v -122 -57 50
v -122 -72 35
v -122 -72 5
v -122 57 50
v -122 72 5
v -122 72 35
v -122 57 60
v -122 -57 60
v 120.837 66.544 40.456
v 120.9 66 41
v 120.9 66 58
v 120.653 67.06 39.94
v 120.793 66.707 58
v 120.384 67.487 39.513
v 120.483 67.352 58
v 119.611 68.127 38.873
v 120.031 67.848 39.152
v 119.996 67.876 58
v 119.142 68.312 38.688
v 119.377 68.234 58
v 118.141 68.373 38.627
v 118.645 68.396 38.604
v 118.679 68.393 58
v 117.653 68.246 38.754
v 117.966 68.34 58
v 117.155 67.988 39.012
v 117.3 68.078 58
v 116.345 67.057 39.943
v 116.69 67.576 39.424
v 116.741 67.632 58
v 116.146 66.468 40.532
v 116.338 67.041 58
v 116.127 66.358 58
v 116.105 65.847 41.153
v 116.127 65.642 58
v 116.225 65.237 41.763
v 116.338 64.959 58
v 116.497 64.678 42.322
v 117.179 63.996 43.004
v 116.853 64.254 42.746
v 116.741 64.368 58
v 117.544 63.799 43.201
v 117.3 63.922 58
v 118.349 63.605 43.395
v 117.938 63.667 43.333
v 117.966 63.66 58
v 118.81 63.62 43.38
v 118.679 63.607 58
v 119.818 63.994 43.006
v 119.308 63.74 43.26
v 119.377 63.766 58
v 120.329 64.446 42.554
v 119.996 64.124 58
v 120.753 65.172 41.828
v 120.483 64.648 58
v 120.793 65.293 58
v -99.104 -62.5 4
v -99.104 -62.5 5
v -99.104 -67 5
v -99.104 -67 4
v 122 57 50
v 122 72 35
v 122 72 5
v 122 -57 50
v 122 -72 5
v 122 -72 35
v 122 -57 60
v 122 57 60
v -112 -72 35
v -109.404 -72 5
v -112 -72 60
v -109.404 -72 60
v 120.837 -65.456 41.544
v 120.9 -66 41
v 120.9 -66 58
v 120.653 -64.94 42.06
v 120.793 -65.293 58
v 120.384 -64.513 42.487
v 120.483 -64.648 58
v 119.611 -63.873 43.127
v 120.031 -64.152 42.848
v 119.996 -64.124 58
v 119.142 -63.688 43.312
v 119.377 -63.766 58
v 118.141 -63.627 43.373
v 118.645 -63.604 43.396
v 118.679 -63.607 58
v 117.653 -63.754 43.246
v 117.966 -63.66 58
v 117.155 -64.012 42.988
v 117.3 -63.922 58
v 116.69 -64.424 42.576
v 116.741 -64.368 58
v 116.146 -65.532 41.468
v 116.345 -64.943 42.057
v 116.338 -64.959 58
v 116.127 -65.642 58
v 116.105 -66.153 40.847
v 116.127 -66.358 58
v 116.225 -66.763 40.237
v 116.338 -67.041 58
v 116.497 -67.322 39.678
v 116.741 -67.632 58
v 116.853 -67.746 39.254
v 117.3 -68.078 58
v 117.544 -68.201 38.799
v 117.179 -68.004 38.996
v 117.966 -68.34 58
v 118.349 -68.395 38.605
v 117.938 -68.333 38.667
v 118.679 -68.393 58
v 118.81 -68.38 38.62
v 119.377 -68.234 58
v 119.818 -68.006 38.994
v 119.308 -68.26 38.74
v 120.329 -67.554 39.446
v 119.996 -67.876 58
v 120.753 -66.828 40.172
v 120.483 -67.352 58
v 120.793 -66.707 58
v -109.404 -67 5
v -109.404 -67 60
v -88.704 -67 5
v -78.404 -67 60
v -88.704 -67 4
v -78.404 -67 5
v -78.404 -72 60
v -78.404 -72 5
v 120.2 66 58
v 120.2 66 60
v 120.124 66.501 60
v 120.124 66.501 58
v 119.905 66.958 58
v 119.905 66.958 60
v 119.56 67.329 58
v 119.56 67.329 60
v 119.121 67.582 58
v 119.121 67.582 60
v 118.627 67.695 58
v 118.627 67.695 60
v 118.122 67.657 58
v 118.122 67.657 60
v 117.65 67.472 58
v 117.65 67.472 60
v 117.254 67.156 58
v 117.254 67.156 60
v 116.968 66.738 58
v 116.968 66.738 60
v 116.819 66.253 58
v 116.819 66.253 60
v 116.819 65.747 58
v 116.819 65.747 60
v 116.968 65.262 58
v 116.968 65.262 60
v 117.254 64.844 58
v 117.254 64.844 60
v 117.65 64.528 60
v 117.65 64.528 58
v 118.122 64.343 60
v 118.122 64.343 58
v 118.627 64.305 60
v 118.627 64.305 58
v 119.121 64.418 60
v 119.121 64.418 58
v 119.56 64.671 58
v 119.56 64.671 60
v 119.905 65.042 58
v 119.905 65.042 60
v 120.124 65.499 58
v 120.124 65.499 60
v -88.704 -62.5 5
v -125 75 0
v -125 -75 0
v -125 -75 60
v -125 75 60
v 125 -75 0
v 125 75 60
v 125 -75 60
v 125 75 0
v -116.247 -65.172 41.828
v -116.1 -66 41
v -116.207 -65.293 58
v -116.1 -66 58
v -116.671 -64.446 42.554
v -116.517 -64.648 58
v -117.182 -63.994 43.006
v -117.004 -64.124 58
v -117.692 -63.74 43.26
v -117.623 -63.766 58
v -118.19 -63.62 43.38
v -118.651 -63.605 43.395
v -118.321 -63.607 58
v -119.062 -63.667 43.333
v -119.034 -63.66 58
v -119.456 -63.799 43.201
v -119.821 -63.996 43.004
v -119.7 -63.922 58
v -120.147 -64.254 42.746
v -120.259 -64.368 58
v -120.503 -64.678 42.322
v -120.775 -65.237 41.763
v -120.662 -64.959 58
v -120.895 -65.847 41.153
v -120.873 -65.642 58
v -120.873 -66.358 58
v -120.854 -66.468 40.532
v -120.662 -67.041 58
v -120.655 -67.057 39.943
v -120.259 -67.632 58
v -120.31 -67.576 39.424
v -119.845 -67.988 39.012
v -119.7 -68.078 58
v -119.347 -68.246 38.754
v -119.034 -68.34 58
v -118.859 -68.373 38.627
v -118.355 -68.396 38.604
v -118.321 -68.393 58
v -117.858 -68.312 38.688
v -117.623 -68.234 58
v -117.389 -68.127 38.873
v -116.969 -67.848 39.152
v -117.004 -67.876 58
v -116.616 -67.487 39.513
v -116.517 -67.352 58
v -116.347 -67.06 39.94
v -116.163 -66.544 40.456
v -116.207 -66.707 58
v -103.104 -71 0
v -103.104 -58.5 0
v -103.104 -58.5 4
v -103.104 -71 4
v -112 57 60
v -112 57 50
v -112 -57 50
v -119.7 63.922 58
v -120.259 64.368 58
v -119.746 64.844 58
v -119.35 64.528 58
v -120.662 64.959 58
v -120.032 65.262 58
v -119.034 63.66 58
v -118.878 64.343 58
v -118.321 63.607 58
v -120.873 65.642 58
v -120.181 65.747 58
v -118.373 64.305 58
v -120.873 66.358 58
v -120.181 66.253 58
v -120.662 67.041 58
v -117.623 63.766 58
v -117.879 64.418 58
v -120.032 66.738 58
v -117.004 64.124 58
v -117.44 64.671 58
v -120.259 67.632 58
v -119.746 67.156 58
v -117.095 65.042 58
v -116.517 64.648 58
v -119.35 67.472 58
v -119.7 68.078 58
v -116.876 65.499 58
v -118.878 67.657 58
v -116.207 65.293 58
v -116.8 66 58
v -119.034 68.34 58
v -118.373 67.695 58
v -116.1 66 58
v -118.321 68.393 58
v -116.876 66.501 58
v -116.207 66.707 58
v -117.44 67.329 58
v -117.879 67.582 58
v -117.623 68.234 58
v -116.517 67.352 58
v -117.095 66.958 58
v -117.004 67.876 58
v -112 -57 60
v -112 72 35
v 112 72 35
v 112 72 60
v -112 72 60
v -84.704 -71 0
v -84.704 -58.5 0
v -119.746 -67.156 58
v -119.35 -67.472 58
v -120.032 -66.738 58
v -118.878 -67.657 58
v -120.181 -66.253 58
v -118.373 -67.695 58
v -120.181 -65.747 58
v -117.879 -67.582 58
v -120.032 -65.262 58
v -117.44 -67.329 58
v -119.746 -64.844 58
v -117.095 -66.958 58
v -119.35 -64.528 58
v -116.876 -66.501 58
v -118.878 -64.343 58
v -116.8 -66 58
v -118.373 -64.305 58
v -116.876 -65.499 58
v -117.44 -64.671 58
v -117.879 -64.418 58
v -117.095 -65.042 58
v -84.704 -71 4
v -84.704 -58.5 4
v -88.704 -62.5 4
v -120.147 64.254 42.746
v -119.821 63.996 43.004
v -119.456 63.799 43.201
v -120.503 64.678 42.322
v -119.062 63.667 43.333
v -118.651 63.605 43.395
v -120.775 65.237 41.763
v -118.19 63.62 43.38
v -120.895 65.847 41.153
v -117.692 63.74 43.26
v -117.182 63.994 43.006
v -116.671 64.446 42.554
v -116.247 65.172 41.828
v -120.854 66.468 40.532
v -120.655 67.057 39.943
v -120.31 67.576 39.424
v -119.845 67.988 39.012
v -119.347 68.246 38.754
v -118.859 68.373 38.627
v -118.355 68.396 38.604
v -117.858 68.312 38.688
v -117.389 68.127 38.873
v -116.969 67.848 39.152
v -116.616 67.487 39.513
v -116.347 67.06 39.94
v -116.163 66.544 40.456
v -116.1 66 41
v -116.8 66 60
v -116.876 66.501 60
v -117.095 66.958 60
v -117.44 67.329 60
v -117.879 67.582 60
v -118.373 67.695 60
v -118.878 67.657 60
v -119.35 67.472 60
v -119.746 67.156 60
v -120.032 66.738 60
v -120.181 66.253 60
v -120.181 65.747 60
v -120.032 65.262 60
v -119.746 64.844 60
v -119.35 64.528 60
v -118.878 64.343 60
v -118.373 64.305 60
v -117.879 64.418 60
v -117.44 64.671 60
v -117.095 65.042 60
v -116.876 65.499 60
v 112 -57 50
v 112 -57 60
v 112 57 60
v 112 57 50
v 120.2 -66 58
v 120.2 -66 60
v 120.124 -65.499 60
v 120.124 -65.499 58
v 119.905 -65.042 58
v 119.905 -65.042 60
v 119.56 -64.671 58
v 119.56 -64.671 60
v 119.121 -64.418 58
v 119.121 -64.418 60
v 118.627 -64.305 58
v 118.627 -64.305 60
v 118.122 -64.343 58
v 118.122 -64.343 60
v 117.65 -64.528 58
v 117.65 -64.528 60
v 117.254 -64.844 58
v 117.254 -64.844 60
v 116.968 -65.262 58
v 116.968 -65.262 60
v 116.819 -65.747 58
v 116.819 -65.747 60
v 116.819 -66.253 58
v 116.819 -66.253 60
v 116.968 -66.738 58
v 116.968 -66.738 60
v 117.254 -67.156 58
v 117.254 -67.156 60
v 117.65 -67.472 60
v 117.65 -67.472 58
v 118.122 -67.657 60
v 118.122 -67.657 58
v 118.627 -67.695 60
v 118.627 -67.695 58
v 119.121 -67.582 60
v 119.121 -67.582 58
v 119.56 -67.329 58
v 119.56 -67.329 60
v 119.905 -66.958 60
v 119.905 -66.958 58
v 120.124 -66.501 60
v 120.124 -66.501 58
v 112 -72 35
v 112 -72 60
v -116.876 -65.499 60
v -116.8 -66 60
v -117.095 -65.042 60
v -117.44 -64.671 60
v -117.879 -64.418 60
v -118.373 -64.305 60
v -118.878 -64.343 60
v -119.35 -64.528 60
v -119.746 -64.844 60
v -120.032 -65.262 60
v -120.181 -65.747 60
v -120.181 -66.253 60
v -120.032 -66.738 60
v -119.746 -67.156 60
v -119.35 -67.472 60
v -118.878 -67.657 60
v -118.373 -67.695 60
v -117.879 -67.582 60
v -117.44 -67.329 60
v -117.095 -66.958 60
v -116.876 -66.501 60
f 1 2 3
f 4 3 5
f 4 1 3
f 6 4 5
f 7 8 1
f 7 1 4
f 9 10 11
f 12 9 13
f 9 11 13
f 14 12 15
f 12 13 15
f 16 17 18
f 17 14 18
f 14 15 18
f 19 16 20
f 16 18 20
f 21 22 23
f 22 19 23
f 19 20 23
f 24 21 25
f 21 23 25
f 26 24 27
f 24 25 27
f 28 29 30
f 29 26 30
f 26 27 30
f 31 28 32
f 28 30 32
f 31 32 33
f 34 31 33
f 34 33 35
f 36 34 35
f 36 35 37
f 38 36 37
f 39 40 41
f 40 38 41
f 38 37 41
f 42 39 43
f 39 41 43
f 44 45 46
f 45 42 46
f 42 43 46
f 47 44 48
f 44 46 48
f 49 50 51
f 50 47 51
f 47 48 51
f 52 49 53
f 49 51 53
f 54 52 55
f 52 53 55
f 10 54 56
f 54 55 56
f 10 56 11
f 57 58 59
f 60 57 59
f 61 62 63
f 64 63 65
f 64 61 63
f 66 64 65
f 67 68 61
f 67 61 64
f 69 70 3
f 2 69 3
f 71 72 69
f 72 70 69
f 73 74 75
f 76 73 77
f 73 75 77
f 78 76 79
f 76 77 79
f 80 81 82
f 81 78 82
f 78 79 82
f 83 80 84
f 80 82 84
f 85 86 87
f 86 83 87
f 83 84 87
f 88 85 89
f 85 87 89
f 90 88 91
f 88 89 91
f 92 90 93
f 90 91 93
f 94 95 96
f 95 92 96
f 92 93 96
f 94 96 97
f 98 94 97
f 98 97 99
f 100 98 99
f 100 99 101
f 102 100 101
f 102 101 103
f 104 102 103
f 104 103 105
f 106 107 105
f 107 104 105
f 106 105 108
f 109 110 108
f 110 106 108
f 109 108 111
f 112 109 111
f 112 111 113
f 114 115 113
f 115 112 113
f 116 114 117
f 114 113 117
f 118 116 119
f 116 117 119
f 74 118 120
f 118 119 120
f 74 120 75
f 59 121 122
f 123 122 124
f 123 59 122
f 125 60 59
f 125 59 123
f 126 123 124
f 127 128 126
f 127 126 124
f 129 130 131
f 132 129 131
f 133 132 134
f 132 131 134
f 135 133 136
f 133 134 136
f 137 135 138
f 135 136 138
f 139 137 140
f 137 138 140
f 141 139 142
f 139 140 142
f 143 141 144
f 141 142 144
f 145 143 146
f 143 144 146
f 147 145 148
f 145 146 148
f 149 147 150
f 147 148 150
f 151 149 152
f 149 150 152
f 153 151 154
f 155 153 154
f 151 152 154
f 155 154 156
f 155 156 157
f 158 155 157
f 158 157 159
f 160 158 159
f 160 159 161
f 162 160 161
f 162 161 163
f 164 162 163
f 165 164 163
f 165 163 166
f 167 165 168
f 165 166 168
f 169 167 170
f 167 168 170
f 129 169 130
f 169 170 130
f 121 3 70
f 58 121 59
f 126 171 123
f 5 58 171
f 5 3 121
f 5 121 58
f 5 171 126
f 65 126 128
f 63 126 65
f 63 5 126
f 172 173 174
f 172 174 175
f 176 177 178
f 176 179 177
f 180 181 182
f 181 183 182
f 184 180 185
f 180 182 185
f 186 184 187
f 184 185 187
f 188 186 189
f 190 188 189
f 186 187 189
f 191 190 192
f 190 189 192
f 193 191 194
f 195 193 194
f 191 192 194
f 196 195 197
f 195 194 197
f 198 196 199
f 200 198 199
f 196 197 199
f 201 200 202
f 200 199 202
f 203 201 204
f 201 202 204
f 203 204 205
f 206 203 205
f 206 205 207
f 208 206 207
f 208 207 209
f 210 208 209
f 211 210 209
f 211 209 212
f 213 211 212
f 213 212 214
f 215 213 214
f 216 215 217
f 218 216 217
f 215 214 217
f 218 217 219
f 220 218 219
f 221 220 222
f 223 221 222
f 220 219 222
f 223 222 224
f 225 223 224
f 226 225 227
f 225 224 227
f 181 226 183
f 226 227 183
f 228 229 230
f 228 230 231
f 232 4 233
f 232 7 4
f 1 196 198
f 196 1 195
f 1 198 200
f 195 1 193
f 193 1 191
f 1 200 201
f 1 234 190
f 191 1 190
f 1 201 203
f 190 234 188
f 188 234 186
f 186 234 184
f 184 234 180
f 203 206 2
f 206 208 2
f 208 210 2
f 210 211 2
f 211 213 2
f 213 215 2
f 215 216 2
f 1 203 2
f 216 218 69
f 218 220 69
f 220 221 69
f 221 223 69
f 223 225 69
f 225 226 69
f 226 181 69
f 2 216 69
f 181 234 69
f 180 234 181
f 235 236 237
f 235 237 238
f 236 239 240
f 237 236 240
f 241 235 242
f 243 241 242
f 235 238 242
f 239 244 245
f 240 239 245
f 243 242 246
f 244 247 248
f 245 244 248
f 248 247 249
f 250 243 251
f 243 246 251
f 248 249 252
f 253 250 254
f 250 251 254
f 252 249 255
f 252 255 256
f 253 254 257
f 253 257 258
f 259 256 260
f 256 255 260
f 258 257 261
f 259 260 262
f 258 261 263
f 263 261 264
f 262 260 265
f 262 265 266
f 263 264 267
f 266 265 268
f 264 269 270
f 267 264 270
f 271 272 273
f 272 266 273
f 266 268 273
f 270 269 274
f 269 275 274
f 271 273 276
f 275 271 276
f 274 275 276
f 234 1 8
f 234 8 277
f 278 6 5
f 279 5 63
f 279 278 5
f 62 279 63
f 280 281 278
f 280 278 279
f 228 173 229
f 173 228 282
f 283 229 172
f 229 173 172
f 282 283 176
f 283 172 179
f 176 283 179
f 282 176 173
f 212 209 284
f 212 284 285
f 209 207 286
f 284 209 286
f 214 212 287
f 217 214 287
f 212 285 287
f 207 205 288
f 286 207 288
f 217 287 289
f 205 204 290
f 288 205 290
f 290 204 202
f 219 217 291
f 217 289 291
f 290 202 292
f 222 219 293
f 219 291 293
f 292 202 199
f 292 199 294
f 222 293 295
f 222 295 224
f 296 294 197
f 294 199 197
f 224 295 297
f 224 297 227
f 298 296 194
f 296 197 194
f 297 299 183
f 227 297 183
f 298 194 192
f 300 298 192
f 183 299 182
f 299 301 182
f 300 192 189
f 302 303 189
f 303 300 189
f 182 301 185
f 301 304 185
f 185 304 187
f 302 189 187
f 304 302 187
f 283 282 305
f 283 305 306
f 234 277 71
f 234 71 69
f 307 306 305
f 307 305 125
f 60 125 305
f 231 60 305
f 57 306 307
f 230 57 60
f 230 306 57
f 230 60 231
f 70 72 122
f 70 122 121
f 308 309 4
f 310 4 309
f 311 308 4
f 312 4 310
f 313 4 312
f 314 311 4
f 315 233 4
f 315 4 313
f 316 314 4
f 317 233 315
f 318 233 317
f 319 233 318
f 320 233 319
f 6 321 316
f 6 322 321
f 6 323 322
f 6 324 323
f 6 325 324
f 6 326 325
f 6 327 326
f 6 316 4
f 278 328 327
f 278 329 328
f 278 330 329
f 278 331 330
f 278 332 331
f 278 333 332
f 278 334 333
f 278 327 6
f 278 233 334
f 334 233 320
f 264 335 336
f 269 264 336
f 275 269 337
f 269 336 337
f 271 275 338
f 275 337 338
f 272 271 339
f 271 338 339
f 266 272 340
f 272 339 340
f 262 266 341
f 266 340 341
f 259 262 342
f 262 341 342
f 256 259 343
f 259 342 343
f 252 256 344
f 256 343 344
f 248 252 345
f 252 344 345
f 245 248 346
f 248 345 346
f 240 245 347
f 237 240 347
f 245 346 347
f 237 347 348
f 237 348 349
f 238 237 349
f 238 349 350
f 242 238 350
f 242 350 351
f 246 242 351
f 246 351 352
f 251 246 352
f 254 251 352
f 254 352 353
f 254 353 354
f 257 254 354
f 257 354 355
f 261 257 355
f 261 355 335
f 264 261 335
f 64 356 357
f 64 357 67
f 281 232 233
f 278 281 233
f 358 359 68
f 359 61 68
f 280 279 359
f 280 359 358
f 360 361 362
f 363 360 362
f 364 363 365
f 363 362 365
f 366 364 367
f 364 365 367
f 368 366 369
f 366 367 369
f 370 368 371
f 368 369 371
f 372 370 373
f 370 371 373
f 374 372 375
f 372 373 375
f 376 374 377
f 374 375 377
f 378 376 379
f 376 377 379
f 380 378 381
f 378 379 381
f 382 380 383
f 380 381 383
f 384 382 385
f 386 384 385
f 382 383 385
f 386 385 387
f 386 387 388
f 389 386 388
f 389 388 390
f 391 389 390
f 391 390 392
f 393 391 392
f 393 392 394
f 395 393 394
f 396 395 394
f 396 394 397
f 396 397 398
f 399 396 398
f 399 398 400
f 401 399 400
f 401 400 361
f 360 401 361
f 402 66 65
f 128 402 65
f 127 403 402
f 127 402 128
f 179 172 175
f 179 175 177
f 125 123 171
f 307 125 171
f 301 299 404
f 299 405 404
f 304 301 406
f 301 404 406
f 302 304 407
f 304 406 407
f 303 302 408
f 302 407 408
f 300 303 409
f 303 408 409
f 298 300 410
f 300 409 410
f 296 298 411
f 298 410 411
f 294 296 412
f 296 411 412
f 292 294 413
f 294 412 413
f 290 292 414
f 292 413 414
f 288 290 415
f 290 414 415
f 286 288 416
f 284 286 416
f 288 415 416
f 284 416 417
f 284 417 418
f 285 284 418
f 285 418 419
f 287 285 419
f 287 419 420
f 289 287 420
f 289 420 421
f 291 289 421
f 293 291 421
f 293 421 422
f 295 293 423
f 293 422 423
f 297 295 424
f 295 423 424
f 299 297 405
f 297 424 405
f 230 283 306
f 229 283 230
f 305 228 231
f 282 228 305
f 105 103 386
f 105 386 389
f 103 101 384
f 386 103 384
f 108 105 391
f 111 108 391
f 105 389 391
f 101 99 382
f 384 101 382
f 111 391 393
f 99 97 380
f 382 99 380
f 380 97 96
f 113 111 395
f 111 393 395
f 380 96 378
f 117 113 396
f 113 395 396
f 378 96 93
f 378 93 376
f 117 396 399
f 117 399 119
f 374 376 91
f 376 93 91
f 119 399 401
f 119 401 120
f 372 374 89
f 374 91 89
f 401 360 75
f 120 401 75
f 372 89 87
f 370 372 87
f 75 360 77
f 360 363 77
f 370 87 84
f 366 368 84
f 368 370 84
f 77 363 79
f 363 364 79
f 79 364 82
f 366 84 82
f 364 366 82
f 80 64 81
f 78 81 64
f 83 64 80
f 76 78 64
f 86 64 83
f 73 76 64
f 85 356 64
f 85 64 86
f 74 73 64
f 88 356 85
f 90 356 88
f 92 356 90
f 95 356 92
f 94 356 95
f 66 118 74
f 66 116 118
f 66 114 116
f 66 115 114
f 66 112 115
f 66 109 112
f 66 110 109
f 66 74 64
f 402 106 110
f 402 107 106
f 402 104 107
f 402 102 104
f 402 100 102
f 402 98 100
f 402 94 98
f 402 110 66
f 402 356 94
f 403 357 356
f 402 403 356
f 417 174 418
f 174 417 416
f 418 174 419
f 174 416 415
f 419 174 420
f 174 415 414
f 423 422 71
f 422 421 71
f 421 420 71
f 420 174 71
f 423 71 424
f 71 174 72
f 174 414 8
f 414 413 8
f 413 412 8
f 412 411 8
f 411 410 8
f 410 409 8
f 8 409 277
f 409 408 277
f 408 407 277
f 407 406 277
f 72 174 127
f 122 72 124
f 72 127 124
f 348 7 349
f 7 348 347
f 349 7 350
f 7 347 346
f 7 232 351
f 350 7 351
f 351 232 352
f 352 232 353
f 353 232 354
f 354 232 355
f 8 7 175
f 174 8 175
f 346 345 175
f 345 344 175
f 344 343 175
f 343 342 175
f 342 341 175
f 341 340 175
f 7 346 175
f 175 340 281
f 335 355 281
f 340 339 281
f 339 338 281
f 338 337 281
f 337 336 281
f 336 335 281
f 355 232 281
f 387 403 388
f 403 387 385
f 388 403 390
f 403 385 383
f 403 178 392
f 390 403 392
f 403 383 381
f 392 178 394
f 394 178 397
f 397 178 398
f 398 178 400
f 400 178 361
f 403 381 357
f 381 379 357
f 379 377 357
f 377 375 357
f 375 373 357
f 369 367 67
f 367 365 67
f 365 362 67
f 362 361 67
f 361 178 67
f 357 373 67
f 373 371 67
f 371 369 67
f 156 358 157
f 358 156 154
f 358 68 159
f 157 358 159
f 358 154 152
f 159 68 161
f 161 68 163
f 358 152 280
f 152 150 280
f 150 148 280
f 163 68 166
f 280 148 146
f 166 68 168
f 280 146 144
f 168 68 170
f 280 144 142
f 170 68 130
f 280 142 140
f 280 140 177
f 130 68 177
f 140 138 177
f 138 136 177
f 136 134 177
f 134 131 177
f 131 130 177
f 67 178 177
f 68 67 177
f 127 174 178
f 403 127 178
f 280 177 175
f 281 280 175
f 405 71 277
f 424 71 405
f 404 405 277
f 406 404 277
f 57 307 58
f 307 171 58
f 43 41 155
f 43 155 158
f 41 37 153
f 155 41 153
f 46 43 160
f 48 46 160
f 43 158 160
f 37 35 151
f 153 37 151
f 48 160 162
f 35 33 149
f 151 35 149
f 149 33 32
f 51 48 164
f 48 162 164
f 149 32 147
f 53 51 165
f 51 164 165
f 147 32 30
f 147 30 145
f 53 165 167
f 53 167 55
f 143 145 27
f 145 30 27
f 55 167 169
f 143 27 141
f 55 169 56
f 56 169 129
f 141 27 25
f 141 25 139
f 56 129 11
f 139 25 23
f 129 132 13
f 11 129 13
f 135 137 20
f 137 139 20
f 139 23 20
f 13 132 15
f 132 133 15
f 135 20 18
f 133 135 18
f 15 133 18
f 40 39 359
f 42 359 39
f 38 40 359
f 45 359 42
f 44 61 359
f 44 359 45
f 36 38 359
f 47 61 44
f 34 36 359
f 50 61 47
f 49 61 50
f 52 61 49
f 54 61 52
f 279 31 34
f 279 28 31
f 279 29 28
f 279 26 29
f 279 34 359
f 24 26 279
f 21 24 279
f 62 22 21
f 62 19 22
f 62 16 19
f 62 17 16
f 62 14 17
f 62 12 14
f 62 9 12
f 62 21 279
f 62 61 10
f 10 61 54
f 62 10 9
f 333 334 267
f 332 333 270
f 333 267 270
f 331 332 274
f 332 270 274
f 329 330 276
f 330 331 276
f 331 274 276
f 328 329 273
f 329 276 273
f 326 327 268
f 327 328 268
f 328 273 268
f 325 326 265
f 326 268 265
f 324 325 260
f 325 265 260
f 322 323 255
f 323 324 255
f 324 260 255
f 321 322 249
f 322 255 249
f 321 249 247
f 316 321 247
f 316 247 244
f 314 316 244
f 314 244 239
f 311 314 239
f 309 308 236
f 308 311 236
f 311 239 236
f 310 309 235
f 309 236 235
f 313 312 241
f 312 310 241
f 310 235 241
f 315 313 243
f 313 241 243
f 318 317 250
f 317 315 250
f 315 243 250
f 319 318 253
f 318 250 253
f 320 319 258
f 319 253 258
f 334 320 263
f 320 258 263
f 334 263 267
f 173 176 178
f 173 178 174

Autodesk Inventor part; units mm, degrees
ref_plane "YZ Plane" through (0, 0, 0) normal (1, 0, 0) x (0, 1, 0)
ref_plane "XZ Plane" through (0, 0, 0) normal (0, 1, 0) x (-1, 0, 0)
ref_plane "XY Plane" through (0, 0, 0) normal (0, 0, 1) x (1, 0, 0)
sketch "Sketch7" plane through (0, 0, 0) normal (0, 0, 1) x (1, 0, 0)
  line L0 (125, -75) -> (-125, -75)
  line L1 (-125, -75) -> (-125, 75)
  line L2 (-125, 75) -> (125, 75)
  line L3 (125, 75) -> (125, -75)
  line L4 (125, -75) -> (-125, 75) construction
  line L5 (-125, -75) -> (125, 75) construction
  point P0 (0, 0)
  dimension "d15" = 250
  dimension "d16" = 150
extrude "Box Outside" add sketch "Sketch7" along normal blind 60
sketch "Sketch8" plane through (0, 0, 60) normal (0, 0, 1) x (1, 0, 0)
  line L0 (-122, 72) -> (122, 72)
  line L1 (122, 72) -> (122, -72)
  line L2 (122, -72) -> (-122, -72)
  line L3 (-122, -72) -> (-122, 72)
  line L4 (125, 75) -> (-125, 75) projected
  line L5 (-125, 75) -> (-125, -75) projected
  line L6 (-125, -75) -> (125, -75) projected
  line L7 (125, -75) -> (125, 75) projected
  point P0 (0, 0)
  dimension "d19" = 3
  dimension "d20" = 3
  dimension "d21" = 3
  dimension "d22" = 3
extrude "Box Cut" cut sketch "Sketch8" against normal blind 55 contours L0 L1 L2 L3
sketch "Sketch9" plane through (-122, -72, 60) normal (0, 1, 0) x (1, 0, 0)
  line L0 (0, 0) -> (10, 0)
  line L1 (10, 0) -> (10, 25)
  line L2 (10, 25) -> (0, 25)
  line L3 (0, 25) -> (0, 0)
  point P0 (122, 60)
  dimension "d25" = 10
  dimension "d26" = 25
extrude "ScrewHole Box LB" add sketch "Sketch9" along normal blind 15
sketch "Sketch10" plane through (-122, -72, 5) normal (0, 1, 0) x (1, 0, 0)
  line L0 (244, -55) -> (244, 0) projected
  line L1 (244, -55) -> (234, -55)
  line L2 (234, -55) -> (234, -30)
  line L3 (234, -30) -> (244, -30)
  line L4 (244, -30) -> (244, -55)
  point P0 (122, 5)
  dimension "d29" = 10
  dimension "d30" = 25
extrude "ScrewHole Box RB" add sketch "Sketch10" along normal blind 15
sketch "Sketch11" plane through (-122, 72, 60) normal (0, -1, 0) x (1, 0, 0)
  line L0 (0, 0) -> (244, 0) projected
  line L1 (0, 0) -> (10, 0)
  line L2 (10, 0) -> (10, -25)
  line L3 (10, -25) -> (0, -25)
  line L4 (0, -25) -> (0, 0)
  point P0 (122, -60)
  dimension "d33" = 10
  dimension "d34" = 25
extrude "ScrewHole Box LU" add sketch "Sketch11" along normal blind 15
sketch "Sketch13" plane through (122, -72, 5) normal (-1, 0, 0) x (0, 0, 1)
  line L0 (55, 144) -> (0, 144) projected
  line L1 (55, 144) -> (30, 144)
  line L2 (30, 144) -> (30, 129)
  line L3 (30, 129) -> (55, 129)
  line L4 (55, 129) -> (55, 144)
  point P0 (-5, 72)
  dimension "d37" = 25
  dimension "d38" = 15
extrude "ScrewHole Box RU" add sketch "Sketch13" along normal blind 10
sketch "Sketch27" plane through (0, 0, 60) normal (0, 0, 1) x (1, 0, 0)
  line L0 (-112, -72) -> (-112, -57) projected
  line L1 (-125, 75) -> (-125, -75) projected
  line L2 (-112, -57) -> (-125, -57)
  line L3 (-125, -57) -> (-125, -75)
  line L4 (-125, -75) -> (-112, -75)
  line L5 (-112, -75) -> (-112, -57)
  line L6 (-112, -57) -> (-125, -75)
  line L7 (-112, -75) -> (-125, -57)
  circle A0 centre (-118.5, -66) radius 2.4
  point P0 (0, 0)
  dimension "d84" = 4.8
extrude "Outside ScrewHole LB" cut sketch "Sketch27" against normal blind 26 contours A0 L7 L6 | L6 L7 A0 | A0 L6 L7 | L7 L6 A0
sketch "Sketch29" plane through (0, 0, 60) normal (0, 0, 1) x (1, 0, 0)
  line L0 (-112, -72) -> (-112, -57) projected
  line L1 (-125, -75) -> (125, -75) projected
  line L2 (-112, -57) -> (-125, -57)
  line L3 (-125, -57) -> (-125, -75)
  line L4 (-125, -75) -> (-112, -75)
  line L5 (-112, -75) -> (-112, -57)
  line L6 (-112, -57) -> (-125, -75)
  circle A0 centre (-118.5, -66) radius 2.4
  point P0 (0, 0)
extrude "ScrewRibbon LB" add sketch "Sketch29" against normal blind 2 contours A0 L6 | L6 A0
sketch "Sketch30" plane through (0, 0, 60) normal (0, 0, 1) x (1, 0, 0)
  line L0 (-122, -57) -> (-112, -57) projected
  line L1 (-125, -75) -> (125, -75) projected
  line L2 (-112, -57) -> (-125, -57)
  line L3 (-125, -57) -> (-125, -75)
  line L4 (-125, -75) -> (-112, -75)
  line L5 (-112, -75) -> (-112, -57)
  line L6 (-112, -57) -> (-125, -75)
  circle A0 centre (-118.5, -66) radius 1.7
  point P0 (0, 0)
  dimension "d92" = 3.4
extrude "Inside ScrewHole LB" cut sketch "Sketch30" against normal blind 24 contours A0 L6 | L6 A0
sketch "Sketch31" plane through (0, 0, 60) normal (0, 0, 1) x (1, 0, 0)
  line L0 (-125, 75) -> (-125, -75) projected
  line L1 (-112, 57) -> (-122, 57) projected
  line L2 (-125, 75) -> (-112, 75)
  line L3 (-112, 75) -> (-112, 57)
  line L4 (-112, 57) -> (-125, 57)
  line L5 (-125, 57) -> (-125, 75)
  line L6 (-125, 75) -> (-112, 57)
  circle A0 centre (-118.5, 66) radius 2.4
  point P0 (0, 0)
  dimension "d95" = 4.8
extrude "Outside ScrewHole LU" cut sketch "Sketch31" against normal blind 24 contours A0 L6 | L6 A0
sketch "Sketch32" plane through (0, 0, 60) normal (0, 0, 1) x (1, 0, 0)
  line L0 (-122, 57) -> (-112, 57) projected
  line L1 (-125, 75) -> (-125, -75) projected
  line L2 (-112, 57) -> (-125, 57)
  line L3 (-125, 57) -> (-125, 75)
  line L4 (-125, 75) -> (-112, 75)
  line L5 (-112, 75) -> (-112, 57)
  line L6 (-112, 75) -> (-125, 57)
  circle A0 centre (-118.5, 66) radius 2.4
  point P0 (0, 0)
  dimension "d98" = 4.8
extrude "ScrewRibbon LU" add sketch "Sketch32" against normal blind 2 contours A0 L6 | L6 A0
sketch "Sketch33" plane through (0, 0, 60) normal (0, 0, 1) x (1, 0, 0)
  line L0 (125, 75) -> (-125, 75) projected
  line L1 (-112, 57) -> (-122, 57) projected
  line L2 (-125, 75) -> (-112, 75)
  line L3 (-112, 75) -> (-112, 57)
  line L4 (-112, 57) -> (-125, 57)
  line L5 (-125, 57) -> (-125, 75)
  line L6 (-125, 75) -> (-112, 57)
  circle A0 centre (-118.5, 66) radius 1.7
  point P0 (0, 0)
  dimension "d101" = 3.4
extrude "Inside ScrewHole LU" cut sketch "Sketch33" against normal blind 21.75 contours A0 L6 | L6 A0
sketch "Sketch34" plane through (0, 0, 60) normal (0, 0, 1) x (1, 0, 0)
  line L0 (112, 57) -> (112, 72) projected
  line L1 (125, 75) -> (-125, 75) projected
  line L2 (112, 57) -> (125, 57)
  line L3 (125, 57) -> (125, 75)
  line L4 (125, 75) -> (112, 75)
  line L5 (112, 75) -> (112, 57)
  line L6 (125, 75) -> (112, 57)
  circle A0 centre (118.5, 66) radius 2.4
  point P0 (0, 0)
  dimension "d104" = 4.8
extrude "Outside ScrewHole RU" cut sketch "Sketch34" against normal blind 37 contours A0 L6 | L6 A0
sketch "Sketch35" plane through (0, 0, 60) normal (0, 0, 1) x (1, 0, 0)
  line L0 (125, -75) -> (125, 75) projected
  line L1 (122, 57) -> (112, 57) projected
  line L2 (125, 75) -> (112, 75)
  line L3 (112, 75) -> (112, 57)
  line L4 (112, 57) -> (125, 57)
  line L5 (125, 57) -> (125, 75)
  line L6 (125, 75) -> (-125, 75) projected
  line L7 (125, 75) -> (112, 57)
  circle A0 centre (118.5, 66) radius 2.4
  point P0 (0, 0)
  dimension "d107" = 4.8
extrude "ScrewRibbon RU" add sketch "Sketch35" against normal blind 2 contours A0 L7 | L7 A0
sketch "Sketch36" plane through (0, 0, 60) normal (0, 0, 1) x (1, 0, 0)
  line L0 (122, 57) -> (112, 57) projected
  line L1 (125, -75) -> (125, 75) projected
  line L2 (112, 57) -> (125, 57)
  line L3 (125, 57) -> (125, 75)
  line L4 (125, 75) -> (112, 75)
  line L5 (112, 75) -> (112, 57)
  line L6 (112, 57) -> (125, 75)
  circle A0 centre (118.5, 66) radius 2.4 projected
  circle A1 centre (118.5, 66) radius 1.7
  point P0 (0, 0)
  dimension "d110" = 3.4
extrude "Inside ScrewHole RU" cut sketch "Sketch36" against normal blind 20 contours A1 L6 | L6 A1
sketch "Sketch37" plane through (0, 0, 60) normal (0, 0, 1) x (1, 0, 0)
  line L0 (125, -75) -> (125, 75) projected
  line L1 (112, -72) -> (112, -57) projected
  line L2 (125, -75) -> (112, -75)
  line L3 (112, -75) -> (112, -57)
  line L4 (112, -57) -> (125, -57)
  line L5 (125, -57) -> (125, -75)
  line L6 (112, -75) -> (125, -57)
  circle A0 centre (118.5, -66) radius 2.4
  point P0 (0, 0)
  dimension "d113" = 4.8
extrude "Outside ScrewHole RB" cut sketch "Sketch37" against normal blind 27.5 contours A0 L6 | L6 A0
sketch "Sketch38" plane through (0, 0, 60) normal (0, 0, 1) x (1, 0, 0)
  line L0 (122, -57) -> (112, -57) projected
  line L1 (125, -75) -> (125, 75) projected
  line L2 (112, -57) -> (125, -57)
  line L3 (125, -57) -> (125, -75)
  line L4 (125, -75) -> (112, -75)
  line L5 (112, -75) -> (112, -57)
  line L6 (125, -57) -> (112, -75)
  circle A0 centre (118.5, -66) radius 2.4
  point P0 (0, 0)
  dimension "d116" = 4.8
extrude "ScrewRibbon RB" add sketch "Sketch38" against normal blind 2 contours A0 L6 | L6 A0
sketch "Sketch39" plane through (0, 0, 60) normal (0, 0, 1) x (1, 0, 0)
  line L0 (112, -72) -> (112, -57) projected
  line L1 (125, -75) -> (125, 75) projected
  line L2 (112, -57) -> (125, -57)
  line L3 (125, -57) -> (125, -75)
  line L4 (125, -75) -> (112, -75)
  line L5 (112, -75) -> (112, -57)
  line L6 (112, -75) -> (125, -57)
  circle A0 centre (118.5, -66) radius 2.4 projected
  circle A1 centre (118.5, -66) radius 1.7
  point P0 (0, 0)
  dimension "d119" = 3.4
extrude "Inside ScrewHole RB" cut sketch "Sketch39" against normal blind 20 contours A1 L6 | L6 A1
sketch "Sketch42" plane through (-122, -72, 5) normal (0, 1, 0) x (1, 0, 0)
  line L0 (244, 0) -> (0, 0) projected
  line L1 (12.5963, 0) -> (43.5963, 0)
  line L2 (43.5963, 0) -> (43.5963, -55)
  line L3 (43.5963, -55) -> (12.5963, -55)
  line L4 (12.5963, -55) -> (12.5963, 0)
  point P0 (122, 5)
  point P1 (43.5963, 0)
  dimension "d134" = 31
  dimension "d135" = 55
extrude "ESPHolder" add sketch "Sketch42" along normal blind 5
sketch "Sketch43" plane through (0, 0, 5) normal (0, 0, 1) x (1, 0, 0)
  line L0 (-109.4037, -67) -> (-78.4037, -67) projected
  line L1 (-99.1037, -67) -> (-88.7037, -67)
  line L2 (-88.7037, -67) -> (-88.7037, -62.5)
  line L3 (-88.7037, -62.5) -> (-99.1037, -62.5)
  line L4 (-99.1037, -62.5) -> (-99.1037, -67)
  line L5 (-78.4037, -67) -> (-109.4037, -67)
  line L6 (-109.4037, -67) -> (-109.4037, -51.7804)
  line L7 (-109.4037, -51.7804) -> (-78.4037, -51.7804)
  line L8 (-78.4037, -51.7804) -> (-78.4037, -67)
  point P0 (0, 0)
  dimension "d138" = 10.3
  dimension "d139" = 10.3
  dimension "d140" = 4.5
extrude "PortHole" cut sketch "Sketch43" against normal through all contours L4 L3 L2 L0
sketch "Sketch44" plane through (0, 0, 0) normal (0, 0, -1) x (-1, 0, 0)
  line L0 (84.7037, -58.5) -> (103.1037, -58.5)
  line L1 (103.1037, -58.5) -> (103.1037, -71)
  line L2 (103.1037, -71) -> (84.7037, -71)
  line L3 (84.7037, -71) -> (84.7037, -58.5)
  line L4 (88.7037, -62.5) -> (99.1037, -62.5) projected
  line L5 (99.1037, -67) -> (88.7037, -67) projected
  line L6 (99.1037, -62.5) -> (99.1037, -67) projected
  line L7 (88.7037, -67) -> (88.7037, -62.5) projected
  point P0 (0, 0)
  dimension "d143" = 4
  dimension "d144" = 4
  dimension "d145" = 4
  dimension "d146" = 4
extrude "Extrusion29" cut sketch "Sketch44" against normal blind 4
chamfer "Chamfer1" distance 15 angle 45 1 edges at (-117, -57, 35)
chamfer "Chamfer2" distance 15 angle 45 1 edges at (-117, 57, 35)
chamfer "Chamfer3" distance 15 angle 45 1 edges at (117, 57, 35)
chamfer "Chamfer4" distance 15 angle 45 1 edges at (117, -57, 35)
properties part number "Box2"
